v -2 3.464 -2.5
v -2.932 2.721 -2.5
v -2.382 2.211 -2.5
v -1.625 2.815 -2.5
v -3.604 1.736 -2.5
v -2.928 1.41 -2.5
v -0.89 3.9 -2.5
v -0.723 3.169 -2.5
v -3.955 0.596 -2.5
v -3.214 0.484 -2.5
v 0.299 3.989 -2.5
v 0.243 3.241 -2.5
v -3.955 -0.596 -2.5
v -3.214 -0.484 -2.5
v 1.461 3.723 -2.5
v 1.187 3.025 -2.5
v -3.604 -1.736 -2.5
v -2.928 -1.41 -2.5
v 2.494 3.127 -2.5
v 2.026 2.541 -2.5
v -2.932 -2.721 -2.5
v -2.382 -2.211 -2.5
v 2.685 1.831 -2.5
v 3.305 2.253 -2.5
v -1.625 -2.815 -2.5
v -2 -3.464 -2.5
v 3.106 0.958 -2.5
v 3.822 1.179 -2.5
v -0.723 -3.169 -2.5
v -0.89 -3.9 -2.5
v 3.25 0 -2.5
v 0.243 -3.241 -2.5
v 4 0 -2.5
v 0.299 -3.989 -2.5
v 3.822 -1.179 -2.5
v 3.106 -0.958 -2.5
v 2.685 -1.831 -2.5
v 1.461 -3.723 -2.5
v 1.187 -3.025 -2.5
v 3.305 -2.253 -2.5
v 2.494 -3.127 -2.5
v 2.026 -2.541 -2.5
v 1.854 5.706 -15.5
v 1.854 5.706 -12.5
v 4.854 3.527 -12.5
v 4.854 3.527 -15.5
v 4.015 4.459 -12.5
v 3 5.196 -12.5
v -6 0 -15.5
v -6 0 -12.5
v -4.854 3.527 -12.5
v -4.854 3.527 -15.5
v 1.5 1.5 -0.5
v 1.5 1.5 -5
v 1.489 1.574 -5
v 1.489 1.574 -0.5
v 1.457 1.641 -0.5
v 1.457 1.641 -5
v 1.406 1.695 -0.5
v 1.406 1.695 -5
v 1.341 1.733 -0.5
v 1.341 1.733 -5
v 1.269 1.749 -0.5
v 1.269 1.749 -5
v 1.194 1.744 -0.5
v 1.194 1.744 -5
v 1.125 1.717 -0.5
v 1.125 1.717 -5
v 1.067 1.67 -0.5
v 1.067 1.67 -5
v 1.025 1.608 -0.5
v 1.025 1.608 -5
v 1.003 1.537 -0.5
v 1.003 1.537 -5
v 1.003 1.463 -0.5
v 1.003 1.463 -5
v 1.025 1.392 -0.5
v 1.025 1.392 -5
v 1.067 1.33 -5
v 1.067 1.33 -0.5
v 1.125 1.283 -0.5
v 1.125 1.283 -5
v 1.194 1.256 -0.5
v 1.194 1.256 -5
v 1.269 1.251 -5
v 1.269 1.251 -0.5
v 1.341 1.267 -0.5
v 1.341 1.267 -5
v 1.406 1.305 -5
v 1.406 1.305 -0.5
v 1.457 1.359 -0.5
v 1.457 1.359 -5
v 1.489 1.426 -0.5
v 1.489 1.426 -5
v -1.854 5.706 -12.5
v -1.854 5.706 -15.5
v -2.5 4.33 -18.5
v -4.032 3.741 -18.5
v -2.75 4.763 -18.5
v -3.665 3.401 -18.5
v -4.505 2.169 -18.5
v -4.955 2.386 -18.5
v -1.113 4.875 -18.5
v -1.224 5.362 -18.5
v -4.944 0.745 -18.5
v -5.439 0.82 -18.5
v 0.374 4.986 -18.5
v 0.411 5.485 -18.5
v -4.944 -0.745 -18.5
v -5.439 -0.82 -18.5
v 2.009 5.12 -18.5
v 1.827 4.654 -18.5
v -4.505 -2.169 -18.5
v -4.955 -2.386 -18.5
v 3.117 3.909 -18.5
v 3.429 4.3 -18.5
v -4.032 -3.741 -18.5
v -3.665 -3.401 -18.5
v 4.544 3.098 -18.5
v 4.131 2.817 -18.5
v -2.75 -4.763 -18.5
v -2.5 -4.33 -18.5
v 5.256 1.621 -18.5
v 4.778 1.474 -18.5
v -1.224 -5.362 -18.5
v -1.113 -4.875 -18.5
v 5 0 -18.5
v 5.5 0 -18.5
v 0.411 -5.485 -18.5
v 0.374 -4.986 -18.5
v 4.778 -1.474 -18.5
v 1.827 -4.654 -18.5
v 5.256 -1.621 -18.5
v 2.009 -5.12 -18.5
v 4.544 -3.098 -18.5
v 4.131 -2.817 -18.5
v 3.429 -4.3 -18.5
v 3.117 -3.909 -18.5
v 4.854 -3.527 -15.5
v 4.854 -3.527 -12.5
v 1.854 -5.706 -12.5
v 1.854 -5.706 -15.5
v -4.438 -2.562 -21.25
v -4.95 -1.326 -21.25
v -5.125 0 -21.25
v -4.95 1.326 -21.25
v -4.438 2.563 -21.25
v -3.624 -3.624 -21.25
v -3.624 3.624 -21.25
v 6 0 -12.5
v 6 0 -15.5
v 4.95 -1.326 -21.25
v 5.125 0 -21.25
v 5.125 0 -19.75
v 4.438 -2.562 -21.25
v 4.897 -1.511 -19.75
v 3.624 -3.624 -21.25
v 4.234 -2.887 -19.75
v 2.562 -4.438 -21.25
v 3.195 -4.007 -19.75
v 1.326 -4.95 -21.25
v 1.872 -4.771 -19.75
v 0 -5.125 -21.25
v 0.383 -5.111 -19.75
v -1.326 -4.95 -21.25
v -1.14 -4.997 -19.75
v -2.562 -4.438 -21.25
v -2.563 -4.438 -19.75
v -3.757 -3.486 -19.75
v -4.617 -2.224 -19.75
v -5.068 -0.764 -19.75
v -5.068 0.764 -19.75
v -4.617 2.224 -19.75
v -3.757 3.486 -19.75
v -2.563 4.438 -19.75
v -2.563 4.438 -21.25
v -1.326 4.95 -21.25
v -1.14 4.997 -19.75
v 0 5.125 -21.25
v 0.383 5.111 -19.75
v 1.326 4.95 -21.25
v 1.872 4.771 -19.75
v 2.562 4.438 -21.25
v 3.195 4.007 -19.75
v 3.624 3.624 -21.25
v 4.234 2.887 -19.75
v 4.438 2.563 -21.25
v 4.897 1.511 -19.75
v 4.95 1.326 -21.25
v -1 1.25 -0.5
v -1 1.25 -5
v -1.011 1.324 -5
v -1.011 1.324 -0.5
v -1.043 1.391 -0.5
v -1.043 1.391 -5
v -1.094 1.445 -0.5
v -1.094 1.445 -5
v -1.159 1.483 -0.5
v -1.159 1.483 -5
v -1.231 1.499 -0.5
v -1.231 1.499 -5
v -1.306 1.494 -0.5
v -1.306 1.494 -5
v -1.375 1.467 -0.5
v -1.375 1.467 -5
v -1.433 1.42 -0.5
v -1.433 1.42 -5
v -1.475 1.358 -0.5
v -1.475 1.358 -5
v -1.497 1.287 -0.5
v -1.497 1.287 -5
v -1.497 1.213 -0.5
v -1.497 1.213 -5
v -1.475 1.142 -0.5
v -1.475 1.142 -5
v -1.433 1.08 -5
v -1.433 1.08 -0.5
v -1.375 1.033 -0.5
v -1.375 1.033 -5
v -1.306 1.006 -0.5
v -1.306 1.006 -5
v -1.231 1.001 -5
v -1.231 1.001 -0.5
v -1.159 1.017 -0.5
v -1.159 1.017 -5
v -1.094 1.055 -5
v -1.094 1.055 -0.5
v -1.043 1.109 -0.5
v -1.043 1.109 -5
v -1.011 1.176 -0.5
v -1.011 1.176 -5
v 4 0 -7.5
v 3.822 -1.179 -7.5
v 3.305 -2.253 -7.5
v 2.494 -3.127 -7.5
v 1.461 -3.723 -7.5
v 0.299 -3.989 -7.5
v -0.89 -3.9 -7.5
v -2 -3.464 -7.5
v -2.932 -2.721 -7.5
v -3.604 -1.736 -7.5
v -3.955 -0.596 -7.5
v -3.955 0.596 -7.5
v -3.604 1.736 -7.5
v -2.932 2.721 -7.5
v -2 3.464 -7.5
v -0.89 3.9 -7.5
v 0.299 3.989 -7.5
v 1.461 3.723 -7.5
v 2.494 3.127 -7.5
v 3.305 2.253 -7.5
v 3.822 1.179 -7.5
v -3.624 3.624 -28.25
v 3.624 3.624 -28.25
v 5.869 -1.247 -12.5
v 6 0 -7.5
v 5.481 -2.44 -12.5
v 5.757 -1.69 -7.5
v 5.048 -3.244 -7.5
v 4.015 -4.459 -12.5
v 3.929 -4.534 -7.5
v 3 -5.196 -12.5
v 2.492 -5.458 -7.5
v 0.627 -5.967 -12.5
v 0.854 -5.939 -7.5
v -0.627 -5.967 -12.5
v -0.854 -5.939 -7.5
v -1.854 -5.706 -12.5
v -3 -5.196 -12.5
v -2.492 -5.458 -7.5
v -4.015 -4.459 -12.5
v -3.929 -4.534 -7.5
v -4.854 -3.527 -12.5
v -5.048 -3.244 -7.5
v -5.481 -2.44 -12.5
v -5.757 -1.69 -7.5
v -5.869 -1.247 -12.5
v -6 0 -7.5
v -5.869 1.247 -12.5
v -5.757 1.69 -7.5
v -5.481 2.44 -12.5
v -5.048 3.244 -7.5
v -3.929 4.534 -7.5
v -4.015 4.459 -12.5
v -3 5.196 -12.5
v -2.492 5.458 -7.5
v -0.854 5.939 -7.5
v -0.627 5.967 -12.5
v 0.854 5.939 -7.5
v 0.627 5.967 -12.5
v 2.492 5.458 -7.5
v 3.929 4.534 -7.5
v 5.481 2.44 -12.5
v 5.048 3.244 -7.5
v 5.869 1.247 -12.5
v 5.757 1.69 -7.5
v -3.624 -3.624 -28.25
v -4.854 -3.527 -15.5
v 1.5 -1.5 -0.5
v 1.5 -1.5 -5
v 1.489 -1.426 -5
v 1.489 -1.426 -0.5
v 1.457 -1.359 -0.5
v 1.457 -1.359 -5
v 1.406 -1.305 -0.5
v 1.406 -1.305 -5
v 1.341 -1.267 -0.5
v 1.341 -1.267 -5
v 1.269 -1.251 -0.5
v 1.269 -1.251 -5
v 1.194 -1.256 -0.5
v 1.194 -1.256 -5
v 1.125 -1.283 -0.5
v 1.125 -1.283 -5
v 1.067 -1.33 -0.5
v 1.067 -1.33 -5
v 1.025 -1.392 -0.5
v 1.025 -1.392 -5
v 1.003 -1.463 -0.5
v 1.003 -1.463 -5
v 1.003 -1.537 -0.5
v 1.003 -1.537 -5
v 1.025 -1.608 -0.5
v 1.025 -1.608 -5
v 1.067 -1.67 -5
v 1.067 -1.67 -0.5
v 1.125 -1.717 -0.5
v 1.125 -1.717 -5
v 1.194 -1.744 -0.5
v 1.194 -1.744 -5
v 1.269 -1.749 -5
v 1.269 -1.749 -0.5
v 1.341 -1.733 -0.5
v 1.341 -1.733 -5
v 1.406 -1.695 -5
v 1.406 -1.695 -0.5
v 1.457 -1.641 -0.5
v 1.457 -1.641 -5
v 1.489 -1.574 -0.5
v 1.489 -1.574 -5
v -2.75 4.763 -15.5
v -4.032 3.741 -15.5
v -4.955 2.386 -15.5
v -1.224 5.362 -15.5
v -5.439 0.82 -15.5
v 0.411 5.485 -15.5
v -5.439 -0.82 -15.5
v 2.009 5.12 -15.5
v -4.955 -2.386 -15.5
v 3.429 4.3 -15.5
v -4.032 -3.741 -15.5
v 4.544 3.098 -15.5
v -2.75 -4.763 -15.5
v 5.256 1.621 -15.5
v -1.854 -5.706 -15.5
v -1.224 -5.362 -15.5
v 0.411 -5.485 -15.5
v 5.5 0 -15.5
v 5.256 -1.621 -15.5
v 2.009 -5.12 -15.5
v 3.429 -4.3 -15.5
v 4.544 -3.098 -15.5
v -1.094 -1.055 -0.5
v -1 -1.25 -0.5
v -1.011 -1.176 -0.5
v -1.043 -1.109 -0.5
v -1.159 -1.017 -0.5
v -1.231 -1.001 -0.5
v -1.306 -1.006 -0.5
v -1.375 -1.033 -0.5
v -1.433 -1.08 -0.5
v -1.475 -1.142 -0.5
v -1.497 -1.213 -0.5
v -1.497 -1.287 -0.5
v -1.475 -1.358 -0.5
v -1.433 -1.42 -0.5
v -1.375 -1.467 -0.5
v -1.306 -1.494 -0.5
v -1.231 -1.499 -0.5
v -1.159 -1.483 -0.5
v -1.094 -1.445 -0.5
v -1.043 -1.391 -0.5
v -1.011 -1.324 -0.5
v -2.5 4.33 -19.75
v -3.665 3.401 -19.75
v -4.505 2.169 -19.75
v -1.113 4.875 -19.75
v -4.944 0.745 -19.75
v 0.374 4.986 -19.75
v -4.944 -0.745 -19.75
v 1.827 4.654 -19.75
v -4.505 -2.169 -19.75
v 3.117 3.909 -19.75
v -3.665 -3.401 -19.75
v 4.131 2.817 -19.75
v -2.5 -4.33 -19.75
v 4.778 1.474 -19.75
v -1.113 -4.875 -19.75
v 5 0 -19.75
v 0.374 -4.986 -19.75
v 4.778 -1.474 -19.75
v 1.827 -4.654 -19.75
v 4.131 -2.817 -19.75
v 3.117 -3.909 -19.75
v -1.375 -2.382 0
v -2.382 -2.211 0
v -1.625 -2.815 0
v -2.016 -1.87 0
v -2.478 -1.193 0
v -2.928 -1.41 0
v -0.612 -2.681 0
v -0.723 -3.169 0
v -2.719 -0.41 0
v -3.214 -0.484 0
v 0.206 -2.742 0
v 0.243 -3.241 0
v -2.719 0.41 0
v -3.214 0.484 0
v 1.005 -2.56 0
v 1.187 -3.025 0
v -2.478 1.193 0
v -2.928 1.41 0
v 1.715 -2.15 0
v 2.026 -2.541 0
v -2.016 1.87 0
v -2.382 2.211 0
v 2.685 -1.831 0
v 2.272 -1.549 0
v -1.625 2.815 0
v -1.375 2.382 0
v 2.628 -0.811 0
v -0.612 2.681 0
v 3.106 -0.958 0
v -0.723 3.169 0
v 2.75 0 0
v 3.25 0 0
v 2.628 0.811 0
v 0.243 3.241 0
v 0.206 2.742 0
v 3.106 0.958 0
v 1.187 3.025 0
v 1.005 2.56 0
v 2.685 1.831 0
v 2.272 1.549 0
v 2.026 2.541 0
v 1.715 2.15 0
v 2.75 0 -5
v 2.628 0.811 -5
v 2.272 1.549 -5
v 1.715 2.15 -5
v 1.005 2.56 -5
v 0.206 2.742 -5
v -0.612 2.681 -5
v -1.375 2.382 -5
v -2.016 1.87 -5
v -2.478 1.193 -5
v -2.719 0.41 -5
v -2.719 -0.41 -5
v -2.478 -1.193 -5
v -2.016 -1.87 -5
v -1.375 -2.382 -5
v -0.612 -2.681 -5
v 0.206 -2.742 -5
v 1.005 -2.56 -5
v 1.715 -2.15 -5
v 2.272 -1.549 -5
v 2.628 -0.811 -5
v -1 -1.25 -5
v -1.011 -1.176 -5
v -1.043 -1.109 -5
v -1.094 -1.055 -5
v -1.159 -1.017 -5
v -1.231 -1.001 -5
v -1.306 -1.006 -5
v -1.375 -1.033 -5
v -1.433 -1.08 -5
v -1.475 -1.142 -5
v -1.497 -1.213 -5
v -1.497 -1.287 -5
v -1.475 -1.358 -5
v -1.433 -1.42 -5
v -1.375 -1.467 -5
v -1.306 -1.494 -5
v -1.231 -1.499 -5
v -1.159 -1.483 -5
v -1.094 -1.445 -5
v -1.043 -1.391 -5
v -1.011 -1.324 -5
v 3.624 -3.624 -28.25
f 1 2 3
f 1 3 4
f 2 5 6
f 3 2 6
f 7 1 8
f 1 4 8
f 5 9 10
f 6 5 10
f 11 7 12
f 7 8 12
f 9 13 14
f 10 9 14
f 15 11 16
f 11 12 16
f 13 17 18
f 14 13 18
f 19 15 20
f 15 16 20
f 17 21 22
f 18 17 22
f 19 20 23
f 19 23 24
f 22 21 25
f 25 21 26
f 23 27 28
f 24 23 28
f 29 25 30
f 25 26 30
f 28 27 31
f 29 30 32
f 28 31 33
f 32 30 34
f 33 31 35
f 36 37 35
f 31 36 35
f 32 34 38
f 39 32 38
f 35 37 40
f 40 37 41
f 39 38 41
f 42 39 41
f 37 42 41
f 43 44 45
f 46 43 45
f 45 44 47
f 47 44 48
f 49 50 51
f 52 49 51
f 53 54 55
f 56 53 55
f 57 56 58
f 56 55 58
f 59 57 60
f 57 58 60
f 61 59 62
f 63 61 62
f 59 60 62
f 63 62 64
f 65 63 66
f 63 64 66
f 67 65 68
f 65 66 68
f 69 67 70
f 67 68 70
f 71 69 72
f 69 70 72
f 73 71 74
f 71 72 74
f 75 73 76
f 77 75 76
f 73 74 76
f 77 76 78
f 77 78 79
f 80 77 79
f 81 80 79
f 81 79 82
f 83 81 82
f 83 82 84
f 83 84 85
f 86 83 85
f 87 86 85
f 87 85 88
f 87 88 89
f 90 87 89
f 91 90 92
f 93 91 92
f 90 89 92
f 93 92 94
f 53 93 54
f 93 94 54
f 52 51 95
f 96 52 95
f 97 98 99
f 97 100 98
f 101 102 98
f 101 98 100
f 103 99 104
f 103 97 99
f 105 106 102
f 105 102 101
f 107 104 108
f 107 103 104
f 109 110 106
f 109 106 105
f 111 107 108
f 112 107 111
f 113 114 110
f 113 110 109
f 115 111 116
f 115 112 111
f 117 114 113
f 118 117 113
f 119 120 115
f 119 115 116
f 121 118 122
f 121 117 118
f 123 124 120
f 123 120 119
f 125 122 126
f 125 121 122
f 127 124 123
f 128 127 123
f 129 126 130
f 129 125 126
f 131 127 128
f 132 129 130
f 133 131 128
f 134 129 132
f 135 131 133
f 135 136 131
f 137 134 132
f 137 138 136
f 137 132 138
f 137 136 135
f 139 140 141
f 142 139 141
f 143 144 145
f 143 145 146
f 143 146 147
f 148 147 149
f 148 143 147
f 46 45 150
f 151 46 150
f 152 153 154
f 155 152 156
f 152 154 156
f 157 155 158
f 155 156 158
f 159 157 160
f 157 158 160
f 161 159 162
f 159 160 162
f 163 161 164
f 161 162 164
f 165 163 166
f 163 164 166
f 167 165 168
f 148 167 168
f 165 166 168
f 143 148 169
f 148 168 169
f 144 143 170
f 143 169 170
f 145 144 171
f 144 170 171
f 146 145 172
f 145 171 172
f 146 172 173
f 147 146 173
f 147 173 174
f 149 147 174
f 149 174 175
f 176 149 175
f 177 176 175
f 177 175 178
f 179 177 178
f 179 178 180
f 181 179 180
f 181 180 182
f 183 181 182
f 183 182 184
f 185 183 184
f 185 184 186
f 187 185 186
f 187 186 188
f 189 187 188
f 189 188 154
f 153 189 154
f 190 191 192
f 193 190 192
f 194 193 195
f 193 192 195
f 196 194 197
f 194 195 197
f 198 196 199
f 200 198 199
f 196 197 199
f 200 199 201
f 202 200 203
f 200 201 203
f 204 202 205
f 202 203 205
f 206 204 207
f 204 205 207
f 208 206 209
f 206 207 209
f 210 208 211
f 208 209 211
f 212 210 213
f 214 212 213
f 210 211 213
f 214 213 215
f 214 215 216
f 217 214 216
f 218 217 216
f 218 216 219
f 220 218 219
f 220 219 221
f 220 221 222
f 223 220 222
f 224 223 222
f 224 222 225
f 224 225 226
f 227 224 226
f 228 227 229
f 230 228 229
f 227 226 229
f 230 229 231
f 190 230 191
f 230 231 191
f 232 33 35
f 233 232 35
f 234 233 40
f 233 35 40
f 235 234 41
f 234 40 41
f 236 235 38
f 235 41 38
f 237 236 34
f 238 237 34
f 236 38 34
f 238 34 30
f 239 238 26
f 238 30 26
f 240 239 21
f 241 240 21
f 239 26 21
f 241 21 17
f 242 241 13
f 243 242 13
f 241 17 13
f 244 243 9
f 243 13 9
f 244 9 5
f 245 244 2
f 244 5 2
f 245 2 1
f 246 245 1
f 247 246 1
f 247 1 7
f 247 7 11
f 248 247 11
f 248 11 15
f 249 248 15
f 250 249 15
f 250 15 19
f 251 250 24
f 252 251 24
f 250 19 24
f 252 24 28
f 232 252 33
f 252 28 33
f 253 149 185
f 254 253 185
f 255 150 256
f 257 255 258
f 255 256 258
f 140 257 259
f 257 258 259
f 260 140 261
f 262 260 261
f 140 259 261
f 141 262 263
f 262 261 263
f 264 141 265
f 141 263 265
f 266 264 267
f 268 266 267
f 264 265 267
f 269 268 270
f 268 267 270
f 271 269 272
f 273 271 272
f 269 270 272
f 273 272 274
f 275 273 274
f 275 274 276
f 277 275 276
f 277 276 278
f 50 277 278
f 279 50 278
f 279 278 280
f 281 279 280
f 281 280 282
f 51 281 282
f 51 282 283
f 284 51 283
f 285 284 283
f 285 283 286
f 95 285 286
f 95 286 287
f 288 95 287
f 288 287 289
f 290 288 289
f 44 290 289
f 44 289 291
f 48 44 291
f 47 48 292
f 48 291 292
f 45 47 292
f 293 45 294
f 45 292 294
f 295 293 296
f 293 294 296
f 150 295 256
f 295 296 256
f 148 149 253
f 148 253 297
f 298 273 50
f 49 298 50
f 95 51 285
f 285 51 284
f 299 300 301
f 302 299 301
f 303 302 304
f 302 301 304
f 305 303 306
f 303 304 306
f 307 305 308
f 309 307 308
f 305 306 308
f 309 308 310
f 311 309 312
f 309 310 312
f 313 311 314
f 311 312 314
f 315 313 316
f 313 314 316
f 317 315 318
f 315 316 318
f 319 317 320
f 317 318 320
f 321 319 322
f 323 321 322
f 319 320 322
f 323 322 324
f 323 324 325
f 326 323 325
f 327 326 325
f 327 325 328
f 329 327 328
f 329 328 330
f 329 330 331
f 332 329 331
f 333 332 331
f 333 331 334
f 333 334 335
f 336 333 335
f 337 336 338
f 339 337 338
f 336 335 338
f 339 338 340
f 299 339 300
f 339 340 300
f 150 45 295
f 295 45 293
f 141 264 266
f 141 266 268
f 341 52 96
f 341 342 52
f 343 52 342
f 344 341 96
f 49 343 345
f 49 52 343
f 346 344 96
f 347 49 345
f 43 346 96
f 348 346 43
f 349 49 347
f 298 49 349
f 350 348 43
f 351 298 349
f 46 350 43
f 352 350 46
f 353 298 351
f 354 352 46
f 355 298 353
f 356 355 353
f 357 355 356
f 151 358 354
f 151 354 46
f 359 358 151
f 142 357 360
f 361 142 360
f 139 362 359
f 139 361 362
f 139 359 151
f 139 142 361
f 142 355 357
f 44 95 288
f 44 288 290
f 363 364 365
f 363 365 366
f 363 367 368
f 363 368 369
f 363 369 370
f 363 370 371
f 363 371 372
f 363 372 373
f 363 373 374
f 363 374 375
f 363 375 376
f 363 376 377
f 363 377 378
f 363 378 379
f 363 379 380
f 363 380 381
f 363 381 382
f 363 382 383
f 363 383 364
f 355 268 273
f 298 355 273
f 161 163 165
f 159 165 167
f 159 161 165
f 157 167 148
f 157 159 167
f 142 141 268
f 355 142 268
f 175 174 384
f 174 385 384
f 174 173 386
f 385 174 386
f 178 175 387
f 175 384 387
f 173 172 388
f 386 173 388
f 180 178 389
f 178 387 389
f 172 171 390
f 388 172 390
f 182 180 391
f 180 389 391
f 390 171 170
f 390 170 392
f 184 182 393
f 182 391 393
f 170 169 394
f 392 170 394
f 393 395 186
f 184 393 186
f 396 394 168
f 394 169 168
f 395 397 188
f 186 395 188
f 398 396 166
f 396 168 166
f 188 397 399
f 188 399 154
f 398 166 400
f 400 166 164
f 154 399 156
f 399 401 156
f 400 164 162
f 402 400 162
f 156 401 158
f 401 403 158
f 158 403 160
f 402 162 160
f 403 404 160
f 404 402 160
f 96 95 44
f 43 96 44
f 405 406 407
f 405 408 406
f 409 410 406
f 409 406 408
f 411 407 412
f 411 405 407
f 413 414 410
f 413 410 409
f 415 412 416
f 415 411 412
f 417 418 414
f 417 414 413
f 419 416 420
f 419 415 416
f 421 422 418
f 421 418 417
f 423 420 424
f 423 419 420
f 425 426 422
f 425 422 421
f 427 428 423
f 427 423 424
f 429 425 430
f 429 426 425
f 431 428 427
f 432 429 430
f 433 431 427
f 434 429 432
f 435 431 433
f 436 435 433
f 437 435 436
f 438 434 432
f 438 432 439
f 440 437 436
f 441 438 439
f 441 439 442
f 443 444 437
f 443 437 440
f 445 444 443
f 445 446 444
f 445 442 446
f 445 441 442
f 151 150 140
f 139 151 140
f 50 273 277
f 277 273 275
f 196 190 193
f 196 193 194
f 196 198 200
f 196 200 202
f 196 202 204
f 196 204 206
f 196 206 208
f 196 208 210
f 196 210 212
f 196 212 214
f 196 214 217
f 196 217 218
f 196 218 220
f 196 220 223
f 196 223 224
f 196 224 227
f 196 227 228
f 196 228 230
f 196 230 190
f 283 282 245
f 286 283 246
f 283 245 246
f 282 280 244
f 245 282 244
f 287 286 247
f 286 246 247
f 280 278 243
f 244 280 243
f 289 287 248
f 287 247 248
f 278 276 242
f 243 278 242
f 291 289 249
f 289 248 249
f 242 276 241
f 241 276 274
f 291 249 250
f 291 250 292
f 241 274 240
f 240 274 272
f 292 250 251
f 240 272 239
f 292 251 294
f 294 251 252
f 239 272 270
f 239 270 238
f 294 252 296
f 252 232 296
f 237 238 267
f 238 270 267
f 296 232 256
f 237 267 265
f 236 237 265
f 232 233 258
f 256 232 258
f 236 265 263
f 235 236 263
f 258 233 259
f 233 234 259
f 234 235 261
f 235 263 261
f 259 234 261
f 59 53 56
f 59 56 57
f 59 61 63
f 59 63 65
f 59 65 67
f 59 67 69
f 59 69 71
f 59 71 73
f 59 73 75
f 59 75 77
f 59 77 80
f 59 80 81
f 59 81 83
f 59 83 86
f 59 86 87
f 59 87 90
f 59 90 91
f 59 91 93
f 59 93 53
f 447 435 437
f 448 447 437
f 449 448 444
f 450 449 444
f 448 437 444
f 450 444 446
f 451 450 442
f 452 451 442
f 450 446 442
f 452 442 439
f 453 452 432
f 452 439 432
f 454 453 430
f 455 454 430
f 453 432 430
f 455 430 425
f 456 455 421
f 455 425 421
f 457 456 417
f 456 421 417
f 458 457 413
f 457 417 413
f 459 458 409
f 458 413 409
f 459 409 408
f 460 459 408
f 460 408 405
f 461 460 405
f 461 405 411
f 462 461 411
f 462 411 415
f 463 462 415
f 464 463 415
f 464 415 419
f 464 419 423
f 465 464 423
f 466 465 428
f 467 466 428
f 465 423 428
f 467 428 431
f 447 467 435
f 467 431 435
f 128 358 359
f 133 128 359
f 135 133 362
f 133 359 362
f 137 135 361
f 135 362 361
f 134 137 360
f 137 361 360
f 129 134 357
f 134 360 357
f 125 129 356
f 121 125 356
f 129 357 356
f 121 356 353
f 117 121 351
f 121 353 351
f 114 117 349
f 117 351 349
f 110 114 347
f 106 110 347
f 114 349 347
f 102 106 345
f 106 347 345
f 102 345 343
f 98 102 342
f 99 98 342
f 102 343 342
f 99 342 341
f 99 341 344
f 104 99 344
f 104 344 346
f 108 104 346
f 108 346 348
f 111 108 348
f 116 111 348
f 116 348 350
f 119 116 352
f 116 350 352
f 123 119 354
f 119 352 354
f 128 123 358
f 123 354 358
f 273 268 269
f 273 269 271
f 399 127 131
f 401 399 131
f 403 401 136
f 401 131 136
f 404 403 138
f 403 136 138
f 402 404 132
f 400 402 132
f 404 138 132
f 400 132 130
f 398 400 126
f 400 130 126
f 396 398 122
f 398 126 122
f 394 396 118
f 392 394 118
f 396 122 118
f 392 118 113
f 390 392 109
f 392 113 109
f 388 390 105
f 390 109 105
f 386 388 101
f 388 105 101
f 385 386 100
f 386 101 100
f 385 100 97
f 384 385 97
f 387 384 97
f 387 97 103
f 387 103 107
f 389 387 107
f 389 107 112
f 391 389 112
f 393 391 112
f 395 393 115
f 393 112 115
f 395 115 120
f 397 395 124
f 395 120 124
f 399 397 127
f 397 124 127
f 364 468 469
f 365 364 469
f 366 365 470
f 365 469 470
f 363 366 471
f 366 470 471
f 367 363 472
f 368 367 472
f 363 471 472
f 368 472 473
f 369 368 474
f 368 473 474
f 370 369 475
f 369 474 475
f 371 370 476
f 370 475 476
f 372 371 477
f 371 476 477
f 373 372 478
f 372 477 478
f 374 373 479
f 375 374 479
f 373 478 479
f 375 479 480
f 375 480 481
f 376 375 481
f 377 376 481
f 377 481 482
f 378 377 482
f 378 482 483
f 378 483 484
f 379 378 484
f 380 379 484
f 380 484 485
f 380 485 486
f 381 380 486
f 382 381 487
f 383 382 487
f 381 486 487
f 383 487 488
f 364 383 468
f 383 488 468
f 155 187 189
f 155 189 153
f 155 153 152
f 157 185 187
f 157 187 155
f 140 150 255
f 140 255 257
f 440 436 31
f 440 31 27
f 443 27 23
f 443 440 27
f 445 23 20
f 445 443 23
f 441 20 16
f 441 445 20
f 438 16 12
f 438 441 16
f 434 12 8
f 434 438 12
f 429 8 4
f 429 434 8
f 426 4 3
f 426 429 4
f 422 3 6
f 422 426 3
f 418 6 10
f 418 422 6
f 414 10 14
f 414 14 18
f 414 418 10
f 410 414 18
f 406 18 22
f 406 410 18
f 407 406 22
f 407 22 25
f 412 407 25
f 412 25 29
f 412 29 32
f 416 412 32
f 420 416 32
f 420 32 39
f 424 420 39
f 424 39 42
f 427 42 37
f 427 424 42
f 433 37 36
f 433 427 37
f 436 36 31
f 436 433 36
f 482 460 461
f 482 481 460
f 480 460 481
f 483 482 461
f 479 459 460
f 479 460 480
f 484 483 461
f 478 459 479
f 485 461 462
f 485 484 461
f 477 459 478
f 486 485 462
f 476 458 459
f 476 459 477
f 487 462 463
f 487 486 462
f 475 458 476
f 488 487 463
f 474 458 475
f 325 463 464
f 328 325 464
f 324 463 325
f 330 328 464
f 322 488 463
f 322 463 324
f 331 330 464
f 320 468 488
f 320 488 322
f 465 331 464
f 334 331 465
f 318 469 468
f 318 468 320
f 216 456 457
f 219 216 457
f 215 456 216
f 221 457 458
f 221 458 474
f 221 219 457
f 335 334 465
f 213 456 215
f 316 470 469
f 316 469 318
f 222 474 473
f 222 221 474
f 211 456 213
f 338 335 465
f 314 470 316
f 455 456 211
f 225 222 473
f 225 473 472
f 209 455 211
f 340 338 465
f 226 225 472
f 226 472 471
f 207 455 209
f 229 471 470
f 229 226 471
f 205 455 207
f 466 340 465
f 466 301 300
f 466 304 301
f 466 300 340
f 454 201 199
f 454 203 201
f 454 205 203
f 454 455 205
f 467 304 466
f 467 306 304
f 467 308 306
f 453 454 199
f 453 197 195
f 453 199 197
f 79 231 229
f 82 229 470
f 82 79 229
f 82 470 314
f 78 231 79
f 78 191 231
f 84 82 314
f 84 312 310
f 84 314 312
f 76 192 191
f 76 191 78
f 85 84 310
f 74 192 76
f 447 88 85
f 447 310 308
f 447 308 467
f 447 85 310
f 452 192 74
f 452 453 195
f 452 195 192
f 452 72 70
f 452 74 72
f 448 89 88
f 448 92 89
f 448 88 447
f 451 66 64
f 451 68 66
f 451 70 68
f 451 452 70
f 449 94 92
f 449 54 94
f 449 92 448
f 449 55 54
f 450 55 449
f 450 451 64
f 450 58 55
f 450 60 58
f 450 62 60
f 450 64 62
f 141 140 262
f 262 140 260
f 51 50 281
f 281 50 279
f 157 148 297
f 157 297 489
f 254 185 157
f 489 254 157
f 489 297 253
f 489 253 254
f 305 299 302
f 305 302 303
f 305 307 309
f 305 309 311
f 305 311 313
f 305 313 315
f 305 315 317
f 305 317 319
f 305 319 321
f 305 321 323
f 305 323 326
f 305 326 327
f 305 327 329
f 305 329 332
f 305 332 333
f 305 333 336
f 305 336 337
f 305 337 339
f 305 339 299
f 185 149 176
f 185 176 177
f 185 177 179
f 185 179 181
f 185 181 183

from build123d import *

# Parameters (mm, degrees)
F0_R      = 3.25
F1_DEPTH  = 2.5
F2_R      = 4
F2_R_2    = 3.25
F3_DEPTH  = 5
F4_R      = 6
F4_R_2    = 4
F5_DEPTH  = 5
F7_DEPTH  = 3
F8_R      = 5.5
F9_DEPTH  = 3
F10_R     = 5
F11_DEPTH = 1.25
F12_R     = 5.125
F12_R_2   = 5
F13_DEPTH = 1.5
F14_W     = 7.2478445072
F14_H     = 7.2478445072
F15_DEPTH = 7
F16_R     = 2.75
F17_DEPTH = 5
F18_R     = 0.25
F19_DEPTH = 4.5


with BuildPart() as f1:
    # F0 (on Top) → F1 (new body)
    with BuildSketch(Plane.XY):
        Circle(F0_R)
    extrude(amount=-F1_DEPTH)

    # F2 (on face) → F3 (join)
    with BuildSketch(Plane(origin=(0, 0, -2.5), x_dir=(1, 0, 0), z_dir=(0, 0, -1))):
        Circle(F2_R)
        Circle(F2_R_2, mode=Mode.SUBTRACT)
        Circle(F2_R_2)
    extrude(amount=F3_DEPTH)

    # F4 (on face) → F5 (join)
    with BuildSketch(Plane(origin=(0, 0, -7.5), x_dir=(1, 0, 0), z_dir=(0, 0, -1))):
        Circle(F4_R)
        Circle(F4_R_2, mode=Mode.SUBTRACT)
        Circle(F4_R_2)
    extrude(amount=F5_DEPTH)

    # F6 (on face) → F7 (join)
    with BuildSketch(Plane(origin=(0, 0, -12.5), x_dir=(1, 0, 0), z_dir=(0, 0, -1))):
        Polygon((4.8541019662, -3.5267115138), (6, 0), (4.8541019662, 3.5267115138), (1.8541019662, 5.7063390978), (-1.8541019662, 5.7063390978), (-4.8541019662, 3.5267115138), (-6, 0), (-4.8541019662, -3.5267115138), (-1.8541019662, -5.7063390978), (1.8541019662, -5.7063390978), align=None)
    extrude(amount=F7_DEPTH)

    # F8 (on face) → F9 (join)
    with BuildSketch(Plane(origin=(0, 0, -15.5), x_dir=(1, 0, 0), z_dir=(0, 0, -1))):
        Circle(F8_R)
    extrude(amount=F9_DEPTH)

    # F10 (on face) → F11 (join)
    with BuildSketch(Plane(origin=(0, 0, -18.5), x_dir=(1, 0, 0), z_dir=(0, 0, -1))):
        Circle(F10_R)
    extrude(amount=F11_DEPTH)

    # F12 (on face) → F13 (join)
    with BuildSketch(Plane(origin=(0, 0, -19.75), x_dir=(1, 0, 0), z_dir=(0, 0, -1))):
        Circle(F12_R)
        Circle(F12_R_2, mode=Mode.SUBTRACT)
        Circle(F12_R_2)
    extrude(amount=F13_DEPTH)

    # F14 (on face) → F15 (join)
    with BuildSketch(Plane(origin=(0, 0, -21.25), x_dir=(1, 0, 0), z_dir=(0, 0, -1))):
        Rectangle(F14_W, F14_H)
    extrude(amount=F15_DEPTH)

    # F16 (on face) → F17 (cut)
    with BuildSketch(Plane.XY):
        Circle(F16_R)
    extrude(amount=-F17_DEPTH, mode=Mode.SUBTRACT)

    # F18 (on face) → F19 (join)
    with BuildSketch(Plane.XY.offset(-5)):
        with Locations((-1.25, -1.25)):
            Circle(F18_R)
        with Locations((1.25, -1.5)):
            Circle(F18_R)
        with Locations((1.25, 1.5)):
            Circle(F18_R)
        with Locations((-1.25, 1.25)):
            Circle(F18_R)
    extrude(amount=F19_DEPTH)


solid = f1.part
